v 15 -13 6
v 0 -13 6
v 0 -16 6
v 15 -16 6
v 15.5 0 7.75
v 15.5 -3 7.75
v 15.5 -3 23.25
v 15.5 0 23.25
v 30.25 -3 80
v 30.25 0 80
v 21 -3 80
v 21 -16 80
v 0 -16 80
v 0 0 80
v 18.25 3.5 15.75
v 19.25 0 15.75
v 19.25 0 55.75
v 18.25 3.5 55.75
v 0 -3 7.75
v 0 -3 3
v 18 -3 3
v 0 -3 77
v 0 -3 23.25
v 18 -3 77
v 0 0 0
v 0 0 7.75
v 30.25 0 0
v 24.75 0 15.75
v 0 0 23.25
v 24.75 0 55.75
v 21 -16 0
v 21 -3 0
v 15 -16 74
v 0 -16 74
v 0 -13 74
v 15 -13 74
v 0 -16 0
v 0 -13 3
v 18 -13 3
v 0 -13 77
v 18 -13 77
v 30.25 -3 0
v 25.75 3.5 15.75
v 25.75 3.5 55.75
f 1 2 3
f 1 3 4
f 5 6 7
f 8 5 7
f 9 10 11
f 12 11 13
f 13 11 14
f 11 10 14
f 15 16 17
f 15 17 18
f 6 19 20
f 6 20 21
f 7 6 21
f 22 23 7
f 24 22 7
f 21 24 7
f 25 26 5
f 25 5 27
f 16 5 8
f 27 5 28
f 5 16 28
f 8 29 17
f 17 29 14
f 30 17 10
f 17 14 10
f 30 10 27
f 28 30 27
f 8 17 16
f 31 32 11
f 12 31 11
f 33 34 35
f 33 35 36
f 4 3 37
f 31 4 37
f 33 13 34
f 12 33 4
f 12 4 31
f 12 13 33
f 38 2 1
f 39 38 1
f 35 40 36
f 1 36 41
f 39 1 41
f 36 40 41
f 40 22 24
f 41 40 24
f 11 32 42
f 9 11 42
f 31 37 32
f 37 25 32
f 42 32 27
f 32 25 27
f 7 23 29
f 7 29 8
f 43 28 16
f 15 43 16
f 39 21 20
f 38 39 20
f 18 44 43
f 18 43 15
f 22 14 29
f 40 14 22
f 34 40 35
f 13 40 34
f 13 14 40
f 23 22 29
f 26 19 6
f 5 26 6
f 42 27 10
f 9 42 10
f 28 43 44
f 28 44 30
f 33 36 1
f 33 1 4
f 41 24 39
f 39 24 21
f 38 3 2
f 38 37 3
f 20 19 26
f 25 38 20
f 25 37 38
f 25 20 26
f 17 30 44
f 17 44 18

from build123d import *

# Parameters (mm, degrees)
F0_W      = 30.25
F0_H      = 80
F1_DEPTH  = 3
F2_W      = 15.5
F2_H      = 15.5
F3_DEPTH  = 3
F4_DEPTH  = 13
F6_W      = 18
F6_H      = 3
F7_DEPTH  = 3
F5_W      = 3
F5_H      = 74
F8_DEPTH  = 3
F9_W      = 15
F9_H      = 3
F10_DEPTH = 3
F11_W     = 7.5
F11_H     = 40
F12_DEPTH = 3.5
F14_DEPTH = 40


with BuildPart() as f1:
    # F0 (on Front) → F1 (new body)
    with BuildSketch(Plane.XZ):
        with Locations((15.125, 40)):
            Rectangle(F0_W, F0_H)
    extrude(amount=F1_DEPTH)

    # F2 (on face) → F3 (cut)
    with BuildSketch(Plane.XZ.offset(3)):
        with Locations((7.75, 15.5)):
            Rectangle(F2_W, F2_H)
    extrude(amount=-F3_DEPTH, mode=Mode.SUBTRACT)

    # F2 (on face) → F4 (join)
    with BuildSketch(Plane.XZ.offset(3)):
        Polygon((18, 3), (0, 3), (0, 0), (21, 0), (21, 80), (0, 80), (0, 77), (18, 77), align=None)
    extrude(amount=F4_DEPTH)

    # F6 (on face) → F7 (join)
    with BuildSketch(Plane.XY.offset(3)):
        with Locations((9, -14.5)):
            Rectangle(F6_W, F6_H)
    extrude(amount=F7_DEPTH)

    # F5 (on face) → F8 (join)
    with BuildSketch(Plane(origin=(18, 0, 0), x_dir=(0, -1, 0), z_dir=(-1, 0, 0))):
        with Locations((14.5, 40)):
            Rectangle(F5_W, F5_H)
    extrude(amount=F8_DEPTH)

    # F9 (on face) → F10 (join)
    with BuildSketch(Plane(origin=(0, 0, 77), x_dir=(1, 0, 0), z_dir=(0, 0, -1))):
        with Locations((7.5, 14.5)):
            Rectangle(F9_W, F9_H)
    extrude(amount=F10_DEPTH)

    # F11 (on face) → F12 (join)
    with BuildSketch(Plane(origin=(0, 0, 0), x_dir=(-1, 0, 0), z_dir=(0, 1, 0))):
        with Locations((-22, 35.75)):
            Rectangle(F11_W, F11_H)
    extrude(amount=F12_DEPTH)

    # F13 (on face) → F14 (cut)
    with BuildSketch(Plane.XY.offset(55.75)):
        Polygon((25.75, 0), (25.75, 3.5), (24.75, 0), align=None)
        Polygon((19.25, 0), (18.25, 3.5), (18.25, 0), align=None)
    extrude(amount=-F14_DEPTH, mode=Mode.SUBTRACT)


solid = f1.part
